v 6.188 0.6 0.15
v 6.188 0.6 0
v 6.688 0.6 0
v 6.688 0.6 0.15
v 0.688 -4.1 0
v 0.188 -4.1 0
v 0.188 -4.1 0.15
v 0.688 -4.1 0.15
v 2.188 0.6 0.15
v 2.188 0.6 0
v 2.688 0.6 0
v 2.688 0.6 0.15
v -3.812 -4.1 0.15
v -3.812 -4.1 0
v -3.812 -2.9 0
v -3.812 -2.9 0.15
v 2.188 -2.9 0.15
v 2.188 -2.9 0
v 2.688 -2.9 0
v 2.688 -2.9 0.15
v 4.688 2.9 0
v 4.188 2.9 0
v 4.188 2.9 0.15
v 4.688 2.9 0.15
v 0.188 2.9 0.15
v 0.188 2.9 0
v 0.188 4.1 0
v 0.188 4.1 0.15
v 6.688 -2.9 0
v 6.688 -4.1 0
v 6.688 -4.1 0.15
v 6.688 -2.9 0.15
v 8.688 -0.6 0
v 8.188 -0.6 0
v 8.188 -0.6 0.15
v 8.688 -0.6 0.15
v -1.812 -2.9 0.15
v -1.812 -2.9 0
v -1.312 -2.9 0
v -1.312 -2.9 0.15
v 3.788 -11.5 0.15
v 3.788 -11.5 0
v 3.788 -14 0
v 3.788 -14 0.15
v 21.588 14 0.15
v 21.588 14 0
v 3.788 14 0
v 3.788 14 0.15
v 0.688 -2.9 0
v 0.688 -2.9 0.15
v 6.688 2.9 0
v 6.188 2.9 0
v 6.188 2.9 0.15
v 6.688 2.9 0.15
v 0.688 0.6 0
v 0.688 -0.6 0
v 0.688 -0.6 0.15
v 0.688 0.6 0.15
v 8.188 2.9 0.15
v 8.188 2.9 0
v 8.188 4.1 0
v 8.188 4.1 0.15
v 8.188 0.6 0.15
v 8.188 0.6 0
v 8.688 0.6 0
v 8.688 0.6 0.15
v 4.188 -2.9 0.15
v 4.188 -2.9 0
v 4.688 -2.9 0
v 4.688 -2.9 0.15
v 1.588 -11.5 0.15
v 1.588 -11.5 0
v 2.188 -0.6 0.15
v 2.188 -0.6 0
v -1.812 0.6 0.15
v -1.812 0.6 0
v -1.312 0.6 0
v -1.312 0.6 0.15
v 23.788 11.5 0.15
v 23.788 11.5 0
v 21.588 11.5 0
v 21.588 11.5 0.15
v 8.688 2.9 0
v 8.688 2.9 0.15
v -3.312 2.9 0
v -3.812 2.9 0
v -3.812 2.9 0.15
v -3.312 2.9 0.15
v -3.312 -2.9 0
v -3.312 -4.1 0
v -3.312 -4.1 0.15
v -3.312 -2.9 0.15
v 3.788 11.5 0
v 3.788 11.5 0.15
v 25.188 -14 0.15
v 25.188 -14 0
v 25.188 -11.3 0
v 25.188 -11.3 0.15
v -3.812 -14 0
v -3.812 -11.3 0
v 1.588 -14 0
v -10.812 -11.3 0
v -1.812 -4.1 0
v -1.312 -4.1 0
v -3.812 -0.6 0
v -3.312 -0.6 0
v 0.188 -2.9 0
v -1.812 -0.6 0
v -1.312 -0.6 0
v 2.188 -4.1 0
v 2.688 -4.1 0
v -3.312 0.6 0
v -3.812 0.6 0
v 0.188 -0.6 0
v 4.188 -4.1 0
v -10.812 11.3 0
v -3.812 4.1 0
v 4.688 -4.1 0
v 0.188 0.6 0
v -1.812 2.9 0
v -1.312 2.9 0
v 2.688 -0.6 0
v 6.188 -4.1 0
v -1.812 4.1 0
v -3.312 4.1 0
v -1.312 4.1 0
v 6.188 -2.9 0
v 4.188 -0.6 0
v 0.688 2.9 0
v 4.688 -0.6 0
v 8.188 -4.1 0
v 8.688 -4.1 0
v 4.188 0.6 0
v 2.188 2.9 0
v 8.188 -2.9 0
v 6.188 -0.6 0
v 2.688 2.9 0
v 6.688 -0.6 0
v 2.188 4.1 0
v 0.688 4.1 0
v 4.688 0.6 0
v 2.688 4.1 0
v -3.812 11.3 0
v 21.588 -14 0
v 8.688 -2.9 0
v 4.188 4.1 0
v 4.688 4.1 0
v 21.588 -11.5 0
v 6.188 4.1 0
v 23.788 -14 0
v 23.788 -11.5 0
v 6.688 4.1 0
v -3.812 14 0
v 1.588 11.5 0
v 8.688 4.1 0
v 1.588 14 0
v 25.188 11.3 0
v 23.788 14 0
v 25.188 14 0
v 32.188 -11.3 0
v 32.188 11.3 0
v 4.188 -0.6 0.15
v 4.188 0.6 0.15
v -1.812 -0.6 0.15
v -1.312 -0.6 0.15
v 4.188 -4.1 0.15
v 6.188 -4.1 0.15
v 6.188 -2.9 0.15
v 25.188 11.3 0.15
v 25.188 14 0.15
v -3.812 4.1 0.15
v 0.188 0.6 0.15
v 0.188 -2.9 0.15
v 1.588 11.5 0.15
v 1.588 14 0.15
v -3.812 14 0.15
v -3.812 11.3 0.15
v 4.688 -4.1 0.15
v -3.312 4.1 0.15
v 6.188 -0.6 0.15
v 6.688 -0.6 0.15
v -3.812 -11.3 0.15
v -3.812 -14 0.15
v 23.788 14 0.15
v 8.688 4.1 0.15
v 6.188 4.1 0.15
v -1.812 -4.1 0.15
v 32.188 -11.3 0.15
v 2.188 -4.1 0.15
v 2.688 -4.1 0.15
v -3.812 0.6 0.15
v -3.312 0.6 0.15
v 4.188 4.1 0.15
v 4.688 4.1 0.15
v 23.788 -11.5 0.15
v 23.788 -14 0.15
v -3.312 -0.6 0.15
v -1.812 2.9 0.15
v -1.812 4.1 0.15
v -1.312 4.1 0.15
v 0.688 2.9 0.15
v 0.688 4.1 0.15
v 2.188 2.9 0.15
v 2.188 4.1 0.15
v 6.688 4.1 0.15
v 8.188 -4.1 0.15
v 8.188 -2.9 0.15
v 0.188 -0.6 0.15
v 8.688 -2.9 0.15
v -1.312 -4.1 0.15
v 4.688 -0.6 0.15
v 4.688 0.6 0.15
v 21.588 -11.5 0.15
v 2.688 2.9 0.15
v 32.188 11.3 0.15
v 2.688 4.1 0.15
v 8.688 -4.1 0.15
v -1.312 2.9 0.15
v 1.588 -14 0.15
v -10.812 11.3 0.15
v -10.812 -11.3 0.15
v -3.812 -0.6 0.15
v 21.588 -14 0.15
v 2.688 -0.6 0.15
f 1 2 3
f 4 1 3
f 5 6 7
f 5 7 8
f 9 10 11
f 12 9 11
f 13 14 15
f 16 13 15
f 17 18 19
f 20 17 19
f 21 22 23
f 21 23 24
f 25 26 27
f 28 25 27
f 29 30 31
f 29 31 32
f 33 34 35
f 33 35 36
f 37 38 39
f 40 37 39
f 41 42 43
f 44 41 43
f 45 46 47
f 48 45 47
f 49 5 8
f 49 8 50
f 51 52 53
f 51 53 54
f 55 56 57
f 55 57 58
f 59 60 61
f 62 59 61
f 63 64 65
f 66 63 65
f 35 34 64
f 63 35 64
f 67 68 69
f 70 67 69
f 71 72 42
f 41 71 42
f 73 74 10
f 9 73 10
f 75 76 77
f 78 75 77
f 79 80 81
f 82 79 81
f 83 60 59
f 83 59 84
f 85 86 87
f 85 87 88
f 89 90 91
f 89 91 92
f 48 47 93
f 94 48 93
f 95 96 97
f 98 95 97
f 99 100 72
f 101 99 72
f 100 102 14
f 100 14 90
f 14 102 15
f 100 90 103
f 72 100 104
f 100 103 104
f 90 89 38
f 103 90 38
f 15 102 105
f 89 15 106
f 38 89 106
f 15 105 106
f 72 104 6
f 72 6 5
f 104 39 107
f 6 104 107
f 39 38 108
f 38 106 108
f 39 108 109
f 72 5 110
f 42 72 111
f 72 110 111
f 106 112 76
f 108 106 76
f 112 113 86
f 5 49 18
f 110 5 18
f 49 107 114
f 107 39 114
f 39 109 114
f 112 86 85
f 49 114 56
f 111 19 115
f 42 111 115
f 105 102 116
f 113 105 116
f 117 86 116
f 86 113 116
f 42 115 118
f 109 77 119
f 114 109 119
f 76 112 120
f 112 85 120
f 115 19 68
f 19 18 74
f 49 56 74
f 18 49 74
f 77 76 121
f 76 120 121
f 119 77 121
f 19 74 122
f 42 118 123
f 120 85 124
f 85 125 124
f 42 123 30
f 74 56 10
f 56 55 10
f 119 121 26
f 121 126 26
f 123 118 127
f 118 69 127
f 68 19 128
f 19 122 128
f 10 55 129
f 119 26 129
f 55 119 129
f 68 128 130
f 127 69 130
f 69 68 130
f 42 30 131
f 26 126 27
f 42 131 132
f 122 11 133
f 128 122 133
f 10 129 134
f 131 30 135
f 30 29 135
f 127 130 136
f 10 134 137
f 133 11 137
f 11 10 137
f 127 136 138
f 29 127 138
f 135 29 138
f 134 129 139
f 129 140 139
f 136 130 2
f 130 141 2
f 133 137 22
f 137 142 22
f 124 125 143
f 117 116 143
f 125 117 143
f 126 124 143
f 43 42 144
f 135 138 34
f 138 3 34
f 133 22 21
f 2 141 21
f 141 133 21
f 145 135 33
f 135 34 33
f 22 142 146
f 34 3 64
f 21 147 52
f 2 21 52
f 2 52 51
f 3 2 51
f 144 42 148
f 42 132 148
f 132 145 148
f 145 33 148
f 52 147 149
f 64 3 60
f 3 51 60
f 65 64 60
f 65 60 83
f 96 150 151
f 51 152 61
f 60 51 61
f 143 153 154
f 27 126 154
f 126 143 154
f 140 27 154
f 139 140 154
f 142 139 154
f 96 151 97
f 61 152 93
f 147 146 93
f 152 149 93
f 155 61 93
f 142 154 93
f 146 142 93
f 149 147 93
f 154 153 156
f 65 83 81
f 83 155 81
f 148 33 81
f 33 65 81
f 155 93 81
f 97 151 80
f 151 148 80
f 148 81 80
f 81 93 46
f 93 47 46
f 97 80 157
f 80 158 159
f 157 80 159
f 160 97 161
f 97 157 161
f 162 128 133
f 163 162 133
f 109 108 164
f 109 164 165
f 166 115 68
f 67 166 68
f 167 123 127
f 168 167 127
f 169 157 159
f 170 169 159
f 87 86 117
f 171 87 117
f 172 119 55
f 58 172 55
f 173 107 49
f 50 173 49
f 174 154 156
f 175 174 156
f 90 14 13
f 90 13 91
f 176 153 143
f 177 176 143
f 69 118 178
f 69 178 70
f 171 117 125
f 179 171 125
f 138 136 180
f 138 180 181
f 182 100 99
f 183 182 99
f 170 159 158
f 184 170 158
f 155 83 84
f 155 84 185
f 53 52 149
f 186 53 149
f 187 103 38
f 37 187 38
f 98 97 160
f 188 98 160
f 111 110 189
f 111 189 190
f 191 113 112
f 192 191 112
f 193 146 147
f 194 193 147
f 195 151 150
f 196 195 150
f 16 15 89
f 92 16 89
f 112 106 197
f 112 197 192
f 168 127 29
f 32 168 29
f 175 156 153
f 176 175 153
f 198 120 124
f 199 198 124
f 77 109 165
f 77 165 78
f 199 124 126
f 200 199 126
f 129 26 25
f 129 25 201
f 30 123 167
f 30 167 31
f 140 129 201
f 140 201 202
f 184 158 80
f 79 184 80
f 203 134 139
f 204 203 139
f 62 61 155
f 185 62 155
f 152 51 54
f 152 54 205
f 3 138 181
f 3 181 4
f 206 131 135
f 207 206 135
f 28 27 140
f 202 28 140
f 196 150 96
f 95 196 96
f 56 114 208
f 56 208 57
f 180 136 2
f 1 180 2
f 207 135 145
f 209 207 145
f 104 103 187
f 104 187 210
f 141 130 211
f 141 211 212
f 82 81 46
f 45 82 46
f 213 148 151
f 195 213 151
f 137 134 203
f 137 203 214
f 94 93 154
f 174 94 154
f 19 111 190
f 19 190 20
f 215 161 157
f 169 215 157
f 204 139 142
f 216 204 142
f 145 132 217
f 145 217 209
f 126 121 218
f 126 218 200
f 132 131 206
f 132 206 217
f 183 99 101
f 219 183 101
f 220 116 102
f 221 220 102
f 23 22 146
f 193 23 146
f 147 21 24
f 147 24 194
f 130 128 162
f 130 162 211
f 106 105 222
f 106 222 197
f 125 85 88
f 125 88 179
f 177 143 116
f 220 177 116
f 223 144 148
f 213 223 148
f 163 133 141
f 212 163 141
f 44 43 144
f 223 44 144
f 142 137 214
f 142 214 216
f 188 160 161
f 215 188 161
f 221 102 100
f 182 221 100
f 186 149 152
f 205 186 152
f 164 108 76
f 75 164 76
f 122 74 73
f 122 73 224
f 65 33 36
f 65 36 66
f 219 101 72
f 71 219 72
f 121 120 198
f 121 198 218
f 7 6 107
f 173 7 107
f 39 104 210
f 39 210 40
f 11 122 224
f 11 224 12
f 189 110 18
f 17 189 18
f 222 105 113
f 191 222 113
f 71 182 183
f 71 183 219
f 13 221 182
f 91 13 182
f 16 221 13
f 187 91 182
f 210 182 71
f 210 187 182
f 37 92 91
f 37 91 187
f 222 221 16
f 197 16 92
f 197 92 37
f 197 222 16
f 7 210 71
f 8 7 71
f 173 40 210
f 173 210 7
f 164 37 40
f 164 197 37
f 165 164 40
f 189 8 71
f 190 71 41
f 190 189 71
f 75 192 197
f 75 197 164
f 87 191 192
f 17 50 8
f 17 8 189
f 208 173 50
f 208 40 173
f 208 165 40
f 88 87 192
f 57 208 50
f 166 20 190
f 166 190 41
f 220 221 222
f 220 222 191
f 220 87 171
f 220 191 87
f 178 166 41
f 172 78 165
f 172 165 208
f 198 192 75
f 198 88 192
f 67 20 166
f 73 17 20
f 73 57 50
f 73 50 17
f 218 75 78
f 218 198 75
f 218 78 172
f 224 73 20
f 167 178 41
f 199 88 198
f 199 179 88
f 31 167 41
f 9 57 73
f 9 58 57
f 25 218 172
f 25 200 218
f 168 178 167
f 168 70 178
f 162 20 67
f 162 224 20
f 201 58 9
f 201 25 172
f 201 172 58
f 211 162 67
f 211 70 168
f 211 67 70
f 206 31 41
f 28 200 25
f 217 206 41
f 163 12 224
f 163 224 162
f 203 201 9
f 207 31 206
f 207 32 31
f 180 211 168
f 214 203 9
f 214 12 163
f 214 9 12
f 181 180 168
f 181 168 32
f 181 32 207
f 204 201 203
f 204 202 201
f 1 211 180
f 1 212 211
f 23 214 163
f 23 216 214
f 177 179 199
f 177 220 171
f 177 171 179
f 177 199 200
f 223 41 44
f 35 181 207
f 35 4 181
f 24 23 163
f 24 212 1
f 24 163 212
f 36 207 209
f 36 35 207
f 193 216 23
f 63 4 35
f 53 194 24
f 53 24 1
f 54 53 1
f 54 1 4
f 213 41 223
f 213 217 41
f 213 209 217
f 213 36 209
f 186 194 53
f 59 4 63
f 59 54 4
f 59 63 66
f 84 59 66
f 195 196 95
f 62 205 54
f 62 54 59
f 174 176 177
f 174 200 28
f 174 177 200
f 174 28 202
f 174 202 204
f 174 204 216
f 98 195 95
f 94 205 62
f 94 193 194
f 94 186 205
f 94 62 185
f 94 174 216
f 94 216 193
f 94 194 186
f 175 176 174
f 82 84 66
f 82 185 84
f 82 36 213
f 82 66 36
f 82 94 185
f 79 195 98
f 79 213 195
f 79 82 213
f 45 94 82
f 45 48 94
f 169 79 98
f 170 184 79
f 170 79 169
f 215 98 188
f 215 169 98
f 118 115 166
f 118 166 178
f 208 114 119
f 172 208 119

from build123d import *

# Parameters (mm, degrees)
F0_W     = 0.5
F0_H     = 1.2
F1_DEPTH = 0.15


with BuildPart() as f1:
    # F0 (on Top) → F1 (new body)
    with BuildSketch(Plane.XY):
        Polygon((25.1875, -11.3), (32.1875, -11.3), (32.1875, 11.3), (25.1875, 11.3), (25.1875, 14), (23.7875, 14), (23.7875, 11.5), (21.5875, 11.5), (21.5875, 14), (3.7875, 14), (3.7875, 11.5), (1.5875, 11.5), (1.5875, 14), (-3.8125, 14), (-3.8125, 11.3), (-10.8125, 11.3), (-10.8125, -11.3), (-3.8125, -11.3), (-3.8125, -14), (1.5875, -14), (1.5875, -11.5), (3.7875, -11.5), (3.7875, -14), (21.5875, -14), (21.5875, -11.5), (23.7875, -11.5), (23.7875, -14), (25.1875, -14), align=None)
        with Locations((-3.5625, -3.499541)):
            Rectangle(F0_W, F0_H, mode=Mode.SUBTRACT)
        with Locations((-1.5625, -3.499541)):
            Rectangle(F0_W, F0_H, mode=Mode.SUBTRACT)
        with Locations((0.4375, -3.499541)):
            Rectangle(F0_W, F0_H, mode=Mode.SUBTRACT)
        with Locations((2.4375, -3.499541)):
            Rectangle(F0_W, F0_H, mode=Mode.SUBTRACT)
        with Locations((4.4375, -3.499541)):
            Rectangle(F0_W, F0_H, mode=Mode.SUBTRACT)
        with Locations((6.4375, -3.499541)):
            Rectangle(F0_W, F0_H, mode=Mode.SUBTRACT)
        with Locations((8.4375, -3.499541)):
            Rectangle(F0_W, F0_H, mode=Mode.SUBTRACT)
        with Locations((-3.5625, 0.000459)):
            Rectangle(F0_W, F0_H, mode=Mode.SUBTRACT)
        with Locations((-1.5625, 0.000459)):
            Rectangle(F0_W, F0_H, mode=Mode.SUBTRACT)
        with Locations((-3.5625, 3.500459)):
            Rectangle(F0_W, F0_H, mode=Mode.SUBTRACT)
        with Locations((-1.5625, 3.500459)):
            Rectangle(F0_W, F0_H, mode=Mode.SUBTRACT)
        with Locations((0.4375, 0.000459)):
            Rectangle(F0_W, F0_H, mode=Mode.SUBTRACT)
        with Locations((2.4375, 0.000459)):
            Rectangle(F0_W, F0_H, mode=Mode.SUBTRACT)
        with Locations((4.4375, 0.000459)):
            Rectangle(F0_W, F0_H, mode=Mode.SUBTRACT)
        with Locations((6.4375, 0.000459)):
            Rectangle(F0_W, F0_H, mode=Mode.SUBTRACT)
        with Locations((8.4375, 0.000459)):
            Rectangle(F0_W, F0_H, mode=Mode.SUBTRACT)
        with Locations((0.4375, 3.500459)):
            Rectangle(F0_W, F0_H, mode=Mode.SUBTRACT)
        with Locations((2.4375, 3.500459)):
            Rectangle(F0_W, F0_H, mode=Mode.SUBTRACT)
        with Locations((4.4375, 3.500459)):
            Rectangle(F0_W, F0_H, mode=Mode.SUBTRACT)
        with Locations((6.4375, 3.500459)):
            Rectangle(F0_W, F0_H, mode=Mode.SUBTRACT)
        with Locations((8.4375, 3.500459)):
            Rectangle(F0_W, F0_H, mode=Mode.SUBTRACT)
    extrude(amount=F1_DEPTH)


solid = f1.part
